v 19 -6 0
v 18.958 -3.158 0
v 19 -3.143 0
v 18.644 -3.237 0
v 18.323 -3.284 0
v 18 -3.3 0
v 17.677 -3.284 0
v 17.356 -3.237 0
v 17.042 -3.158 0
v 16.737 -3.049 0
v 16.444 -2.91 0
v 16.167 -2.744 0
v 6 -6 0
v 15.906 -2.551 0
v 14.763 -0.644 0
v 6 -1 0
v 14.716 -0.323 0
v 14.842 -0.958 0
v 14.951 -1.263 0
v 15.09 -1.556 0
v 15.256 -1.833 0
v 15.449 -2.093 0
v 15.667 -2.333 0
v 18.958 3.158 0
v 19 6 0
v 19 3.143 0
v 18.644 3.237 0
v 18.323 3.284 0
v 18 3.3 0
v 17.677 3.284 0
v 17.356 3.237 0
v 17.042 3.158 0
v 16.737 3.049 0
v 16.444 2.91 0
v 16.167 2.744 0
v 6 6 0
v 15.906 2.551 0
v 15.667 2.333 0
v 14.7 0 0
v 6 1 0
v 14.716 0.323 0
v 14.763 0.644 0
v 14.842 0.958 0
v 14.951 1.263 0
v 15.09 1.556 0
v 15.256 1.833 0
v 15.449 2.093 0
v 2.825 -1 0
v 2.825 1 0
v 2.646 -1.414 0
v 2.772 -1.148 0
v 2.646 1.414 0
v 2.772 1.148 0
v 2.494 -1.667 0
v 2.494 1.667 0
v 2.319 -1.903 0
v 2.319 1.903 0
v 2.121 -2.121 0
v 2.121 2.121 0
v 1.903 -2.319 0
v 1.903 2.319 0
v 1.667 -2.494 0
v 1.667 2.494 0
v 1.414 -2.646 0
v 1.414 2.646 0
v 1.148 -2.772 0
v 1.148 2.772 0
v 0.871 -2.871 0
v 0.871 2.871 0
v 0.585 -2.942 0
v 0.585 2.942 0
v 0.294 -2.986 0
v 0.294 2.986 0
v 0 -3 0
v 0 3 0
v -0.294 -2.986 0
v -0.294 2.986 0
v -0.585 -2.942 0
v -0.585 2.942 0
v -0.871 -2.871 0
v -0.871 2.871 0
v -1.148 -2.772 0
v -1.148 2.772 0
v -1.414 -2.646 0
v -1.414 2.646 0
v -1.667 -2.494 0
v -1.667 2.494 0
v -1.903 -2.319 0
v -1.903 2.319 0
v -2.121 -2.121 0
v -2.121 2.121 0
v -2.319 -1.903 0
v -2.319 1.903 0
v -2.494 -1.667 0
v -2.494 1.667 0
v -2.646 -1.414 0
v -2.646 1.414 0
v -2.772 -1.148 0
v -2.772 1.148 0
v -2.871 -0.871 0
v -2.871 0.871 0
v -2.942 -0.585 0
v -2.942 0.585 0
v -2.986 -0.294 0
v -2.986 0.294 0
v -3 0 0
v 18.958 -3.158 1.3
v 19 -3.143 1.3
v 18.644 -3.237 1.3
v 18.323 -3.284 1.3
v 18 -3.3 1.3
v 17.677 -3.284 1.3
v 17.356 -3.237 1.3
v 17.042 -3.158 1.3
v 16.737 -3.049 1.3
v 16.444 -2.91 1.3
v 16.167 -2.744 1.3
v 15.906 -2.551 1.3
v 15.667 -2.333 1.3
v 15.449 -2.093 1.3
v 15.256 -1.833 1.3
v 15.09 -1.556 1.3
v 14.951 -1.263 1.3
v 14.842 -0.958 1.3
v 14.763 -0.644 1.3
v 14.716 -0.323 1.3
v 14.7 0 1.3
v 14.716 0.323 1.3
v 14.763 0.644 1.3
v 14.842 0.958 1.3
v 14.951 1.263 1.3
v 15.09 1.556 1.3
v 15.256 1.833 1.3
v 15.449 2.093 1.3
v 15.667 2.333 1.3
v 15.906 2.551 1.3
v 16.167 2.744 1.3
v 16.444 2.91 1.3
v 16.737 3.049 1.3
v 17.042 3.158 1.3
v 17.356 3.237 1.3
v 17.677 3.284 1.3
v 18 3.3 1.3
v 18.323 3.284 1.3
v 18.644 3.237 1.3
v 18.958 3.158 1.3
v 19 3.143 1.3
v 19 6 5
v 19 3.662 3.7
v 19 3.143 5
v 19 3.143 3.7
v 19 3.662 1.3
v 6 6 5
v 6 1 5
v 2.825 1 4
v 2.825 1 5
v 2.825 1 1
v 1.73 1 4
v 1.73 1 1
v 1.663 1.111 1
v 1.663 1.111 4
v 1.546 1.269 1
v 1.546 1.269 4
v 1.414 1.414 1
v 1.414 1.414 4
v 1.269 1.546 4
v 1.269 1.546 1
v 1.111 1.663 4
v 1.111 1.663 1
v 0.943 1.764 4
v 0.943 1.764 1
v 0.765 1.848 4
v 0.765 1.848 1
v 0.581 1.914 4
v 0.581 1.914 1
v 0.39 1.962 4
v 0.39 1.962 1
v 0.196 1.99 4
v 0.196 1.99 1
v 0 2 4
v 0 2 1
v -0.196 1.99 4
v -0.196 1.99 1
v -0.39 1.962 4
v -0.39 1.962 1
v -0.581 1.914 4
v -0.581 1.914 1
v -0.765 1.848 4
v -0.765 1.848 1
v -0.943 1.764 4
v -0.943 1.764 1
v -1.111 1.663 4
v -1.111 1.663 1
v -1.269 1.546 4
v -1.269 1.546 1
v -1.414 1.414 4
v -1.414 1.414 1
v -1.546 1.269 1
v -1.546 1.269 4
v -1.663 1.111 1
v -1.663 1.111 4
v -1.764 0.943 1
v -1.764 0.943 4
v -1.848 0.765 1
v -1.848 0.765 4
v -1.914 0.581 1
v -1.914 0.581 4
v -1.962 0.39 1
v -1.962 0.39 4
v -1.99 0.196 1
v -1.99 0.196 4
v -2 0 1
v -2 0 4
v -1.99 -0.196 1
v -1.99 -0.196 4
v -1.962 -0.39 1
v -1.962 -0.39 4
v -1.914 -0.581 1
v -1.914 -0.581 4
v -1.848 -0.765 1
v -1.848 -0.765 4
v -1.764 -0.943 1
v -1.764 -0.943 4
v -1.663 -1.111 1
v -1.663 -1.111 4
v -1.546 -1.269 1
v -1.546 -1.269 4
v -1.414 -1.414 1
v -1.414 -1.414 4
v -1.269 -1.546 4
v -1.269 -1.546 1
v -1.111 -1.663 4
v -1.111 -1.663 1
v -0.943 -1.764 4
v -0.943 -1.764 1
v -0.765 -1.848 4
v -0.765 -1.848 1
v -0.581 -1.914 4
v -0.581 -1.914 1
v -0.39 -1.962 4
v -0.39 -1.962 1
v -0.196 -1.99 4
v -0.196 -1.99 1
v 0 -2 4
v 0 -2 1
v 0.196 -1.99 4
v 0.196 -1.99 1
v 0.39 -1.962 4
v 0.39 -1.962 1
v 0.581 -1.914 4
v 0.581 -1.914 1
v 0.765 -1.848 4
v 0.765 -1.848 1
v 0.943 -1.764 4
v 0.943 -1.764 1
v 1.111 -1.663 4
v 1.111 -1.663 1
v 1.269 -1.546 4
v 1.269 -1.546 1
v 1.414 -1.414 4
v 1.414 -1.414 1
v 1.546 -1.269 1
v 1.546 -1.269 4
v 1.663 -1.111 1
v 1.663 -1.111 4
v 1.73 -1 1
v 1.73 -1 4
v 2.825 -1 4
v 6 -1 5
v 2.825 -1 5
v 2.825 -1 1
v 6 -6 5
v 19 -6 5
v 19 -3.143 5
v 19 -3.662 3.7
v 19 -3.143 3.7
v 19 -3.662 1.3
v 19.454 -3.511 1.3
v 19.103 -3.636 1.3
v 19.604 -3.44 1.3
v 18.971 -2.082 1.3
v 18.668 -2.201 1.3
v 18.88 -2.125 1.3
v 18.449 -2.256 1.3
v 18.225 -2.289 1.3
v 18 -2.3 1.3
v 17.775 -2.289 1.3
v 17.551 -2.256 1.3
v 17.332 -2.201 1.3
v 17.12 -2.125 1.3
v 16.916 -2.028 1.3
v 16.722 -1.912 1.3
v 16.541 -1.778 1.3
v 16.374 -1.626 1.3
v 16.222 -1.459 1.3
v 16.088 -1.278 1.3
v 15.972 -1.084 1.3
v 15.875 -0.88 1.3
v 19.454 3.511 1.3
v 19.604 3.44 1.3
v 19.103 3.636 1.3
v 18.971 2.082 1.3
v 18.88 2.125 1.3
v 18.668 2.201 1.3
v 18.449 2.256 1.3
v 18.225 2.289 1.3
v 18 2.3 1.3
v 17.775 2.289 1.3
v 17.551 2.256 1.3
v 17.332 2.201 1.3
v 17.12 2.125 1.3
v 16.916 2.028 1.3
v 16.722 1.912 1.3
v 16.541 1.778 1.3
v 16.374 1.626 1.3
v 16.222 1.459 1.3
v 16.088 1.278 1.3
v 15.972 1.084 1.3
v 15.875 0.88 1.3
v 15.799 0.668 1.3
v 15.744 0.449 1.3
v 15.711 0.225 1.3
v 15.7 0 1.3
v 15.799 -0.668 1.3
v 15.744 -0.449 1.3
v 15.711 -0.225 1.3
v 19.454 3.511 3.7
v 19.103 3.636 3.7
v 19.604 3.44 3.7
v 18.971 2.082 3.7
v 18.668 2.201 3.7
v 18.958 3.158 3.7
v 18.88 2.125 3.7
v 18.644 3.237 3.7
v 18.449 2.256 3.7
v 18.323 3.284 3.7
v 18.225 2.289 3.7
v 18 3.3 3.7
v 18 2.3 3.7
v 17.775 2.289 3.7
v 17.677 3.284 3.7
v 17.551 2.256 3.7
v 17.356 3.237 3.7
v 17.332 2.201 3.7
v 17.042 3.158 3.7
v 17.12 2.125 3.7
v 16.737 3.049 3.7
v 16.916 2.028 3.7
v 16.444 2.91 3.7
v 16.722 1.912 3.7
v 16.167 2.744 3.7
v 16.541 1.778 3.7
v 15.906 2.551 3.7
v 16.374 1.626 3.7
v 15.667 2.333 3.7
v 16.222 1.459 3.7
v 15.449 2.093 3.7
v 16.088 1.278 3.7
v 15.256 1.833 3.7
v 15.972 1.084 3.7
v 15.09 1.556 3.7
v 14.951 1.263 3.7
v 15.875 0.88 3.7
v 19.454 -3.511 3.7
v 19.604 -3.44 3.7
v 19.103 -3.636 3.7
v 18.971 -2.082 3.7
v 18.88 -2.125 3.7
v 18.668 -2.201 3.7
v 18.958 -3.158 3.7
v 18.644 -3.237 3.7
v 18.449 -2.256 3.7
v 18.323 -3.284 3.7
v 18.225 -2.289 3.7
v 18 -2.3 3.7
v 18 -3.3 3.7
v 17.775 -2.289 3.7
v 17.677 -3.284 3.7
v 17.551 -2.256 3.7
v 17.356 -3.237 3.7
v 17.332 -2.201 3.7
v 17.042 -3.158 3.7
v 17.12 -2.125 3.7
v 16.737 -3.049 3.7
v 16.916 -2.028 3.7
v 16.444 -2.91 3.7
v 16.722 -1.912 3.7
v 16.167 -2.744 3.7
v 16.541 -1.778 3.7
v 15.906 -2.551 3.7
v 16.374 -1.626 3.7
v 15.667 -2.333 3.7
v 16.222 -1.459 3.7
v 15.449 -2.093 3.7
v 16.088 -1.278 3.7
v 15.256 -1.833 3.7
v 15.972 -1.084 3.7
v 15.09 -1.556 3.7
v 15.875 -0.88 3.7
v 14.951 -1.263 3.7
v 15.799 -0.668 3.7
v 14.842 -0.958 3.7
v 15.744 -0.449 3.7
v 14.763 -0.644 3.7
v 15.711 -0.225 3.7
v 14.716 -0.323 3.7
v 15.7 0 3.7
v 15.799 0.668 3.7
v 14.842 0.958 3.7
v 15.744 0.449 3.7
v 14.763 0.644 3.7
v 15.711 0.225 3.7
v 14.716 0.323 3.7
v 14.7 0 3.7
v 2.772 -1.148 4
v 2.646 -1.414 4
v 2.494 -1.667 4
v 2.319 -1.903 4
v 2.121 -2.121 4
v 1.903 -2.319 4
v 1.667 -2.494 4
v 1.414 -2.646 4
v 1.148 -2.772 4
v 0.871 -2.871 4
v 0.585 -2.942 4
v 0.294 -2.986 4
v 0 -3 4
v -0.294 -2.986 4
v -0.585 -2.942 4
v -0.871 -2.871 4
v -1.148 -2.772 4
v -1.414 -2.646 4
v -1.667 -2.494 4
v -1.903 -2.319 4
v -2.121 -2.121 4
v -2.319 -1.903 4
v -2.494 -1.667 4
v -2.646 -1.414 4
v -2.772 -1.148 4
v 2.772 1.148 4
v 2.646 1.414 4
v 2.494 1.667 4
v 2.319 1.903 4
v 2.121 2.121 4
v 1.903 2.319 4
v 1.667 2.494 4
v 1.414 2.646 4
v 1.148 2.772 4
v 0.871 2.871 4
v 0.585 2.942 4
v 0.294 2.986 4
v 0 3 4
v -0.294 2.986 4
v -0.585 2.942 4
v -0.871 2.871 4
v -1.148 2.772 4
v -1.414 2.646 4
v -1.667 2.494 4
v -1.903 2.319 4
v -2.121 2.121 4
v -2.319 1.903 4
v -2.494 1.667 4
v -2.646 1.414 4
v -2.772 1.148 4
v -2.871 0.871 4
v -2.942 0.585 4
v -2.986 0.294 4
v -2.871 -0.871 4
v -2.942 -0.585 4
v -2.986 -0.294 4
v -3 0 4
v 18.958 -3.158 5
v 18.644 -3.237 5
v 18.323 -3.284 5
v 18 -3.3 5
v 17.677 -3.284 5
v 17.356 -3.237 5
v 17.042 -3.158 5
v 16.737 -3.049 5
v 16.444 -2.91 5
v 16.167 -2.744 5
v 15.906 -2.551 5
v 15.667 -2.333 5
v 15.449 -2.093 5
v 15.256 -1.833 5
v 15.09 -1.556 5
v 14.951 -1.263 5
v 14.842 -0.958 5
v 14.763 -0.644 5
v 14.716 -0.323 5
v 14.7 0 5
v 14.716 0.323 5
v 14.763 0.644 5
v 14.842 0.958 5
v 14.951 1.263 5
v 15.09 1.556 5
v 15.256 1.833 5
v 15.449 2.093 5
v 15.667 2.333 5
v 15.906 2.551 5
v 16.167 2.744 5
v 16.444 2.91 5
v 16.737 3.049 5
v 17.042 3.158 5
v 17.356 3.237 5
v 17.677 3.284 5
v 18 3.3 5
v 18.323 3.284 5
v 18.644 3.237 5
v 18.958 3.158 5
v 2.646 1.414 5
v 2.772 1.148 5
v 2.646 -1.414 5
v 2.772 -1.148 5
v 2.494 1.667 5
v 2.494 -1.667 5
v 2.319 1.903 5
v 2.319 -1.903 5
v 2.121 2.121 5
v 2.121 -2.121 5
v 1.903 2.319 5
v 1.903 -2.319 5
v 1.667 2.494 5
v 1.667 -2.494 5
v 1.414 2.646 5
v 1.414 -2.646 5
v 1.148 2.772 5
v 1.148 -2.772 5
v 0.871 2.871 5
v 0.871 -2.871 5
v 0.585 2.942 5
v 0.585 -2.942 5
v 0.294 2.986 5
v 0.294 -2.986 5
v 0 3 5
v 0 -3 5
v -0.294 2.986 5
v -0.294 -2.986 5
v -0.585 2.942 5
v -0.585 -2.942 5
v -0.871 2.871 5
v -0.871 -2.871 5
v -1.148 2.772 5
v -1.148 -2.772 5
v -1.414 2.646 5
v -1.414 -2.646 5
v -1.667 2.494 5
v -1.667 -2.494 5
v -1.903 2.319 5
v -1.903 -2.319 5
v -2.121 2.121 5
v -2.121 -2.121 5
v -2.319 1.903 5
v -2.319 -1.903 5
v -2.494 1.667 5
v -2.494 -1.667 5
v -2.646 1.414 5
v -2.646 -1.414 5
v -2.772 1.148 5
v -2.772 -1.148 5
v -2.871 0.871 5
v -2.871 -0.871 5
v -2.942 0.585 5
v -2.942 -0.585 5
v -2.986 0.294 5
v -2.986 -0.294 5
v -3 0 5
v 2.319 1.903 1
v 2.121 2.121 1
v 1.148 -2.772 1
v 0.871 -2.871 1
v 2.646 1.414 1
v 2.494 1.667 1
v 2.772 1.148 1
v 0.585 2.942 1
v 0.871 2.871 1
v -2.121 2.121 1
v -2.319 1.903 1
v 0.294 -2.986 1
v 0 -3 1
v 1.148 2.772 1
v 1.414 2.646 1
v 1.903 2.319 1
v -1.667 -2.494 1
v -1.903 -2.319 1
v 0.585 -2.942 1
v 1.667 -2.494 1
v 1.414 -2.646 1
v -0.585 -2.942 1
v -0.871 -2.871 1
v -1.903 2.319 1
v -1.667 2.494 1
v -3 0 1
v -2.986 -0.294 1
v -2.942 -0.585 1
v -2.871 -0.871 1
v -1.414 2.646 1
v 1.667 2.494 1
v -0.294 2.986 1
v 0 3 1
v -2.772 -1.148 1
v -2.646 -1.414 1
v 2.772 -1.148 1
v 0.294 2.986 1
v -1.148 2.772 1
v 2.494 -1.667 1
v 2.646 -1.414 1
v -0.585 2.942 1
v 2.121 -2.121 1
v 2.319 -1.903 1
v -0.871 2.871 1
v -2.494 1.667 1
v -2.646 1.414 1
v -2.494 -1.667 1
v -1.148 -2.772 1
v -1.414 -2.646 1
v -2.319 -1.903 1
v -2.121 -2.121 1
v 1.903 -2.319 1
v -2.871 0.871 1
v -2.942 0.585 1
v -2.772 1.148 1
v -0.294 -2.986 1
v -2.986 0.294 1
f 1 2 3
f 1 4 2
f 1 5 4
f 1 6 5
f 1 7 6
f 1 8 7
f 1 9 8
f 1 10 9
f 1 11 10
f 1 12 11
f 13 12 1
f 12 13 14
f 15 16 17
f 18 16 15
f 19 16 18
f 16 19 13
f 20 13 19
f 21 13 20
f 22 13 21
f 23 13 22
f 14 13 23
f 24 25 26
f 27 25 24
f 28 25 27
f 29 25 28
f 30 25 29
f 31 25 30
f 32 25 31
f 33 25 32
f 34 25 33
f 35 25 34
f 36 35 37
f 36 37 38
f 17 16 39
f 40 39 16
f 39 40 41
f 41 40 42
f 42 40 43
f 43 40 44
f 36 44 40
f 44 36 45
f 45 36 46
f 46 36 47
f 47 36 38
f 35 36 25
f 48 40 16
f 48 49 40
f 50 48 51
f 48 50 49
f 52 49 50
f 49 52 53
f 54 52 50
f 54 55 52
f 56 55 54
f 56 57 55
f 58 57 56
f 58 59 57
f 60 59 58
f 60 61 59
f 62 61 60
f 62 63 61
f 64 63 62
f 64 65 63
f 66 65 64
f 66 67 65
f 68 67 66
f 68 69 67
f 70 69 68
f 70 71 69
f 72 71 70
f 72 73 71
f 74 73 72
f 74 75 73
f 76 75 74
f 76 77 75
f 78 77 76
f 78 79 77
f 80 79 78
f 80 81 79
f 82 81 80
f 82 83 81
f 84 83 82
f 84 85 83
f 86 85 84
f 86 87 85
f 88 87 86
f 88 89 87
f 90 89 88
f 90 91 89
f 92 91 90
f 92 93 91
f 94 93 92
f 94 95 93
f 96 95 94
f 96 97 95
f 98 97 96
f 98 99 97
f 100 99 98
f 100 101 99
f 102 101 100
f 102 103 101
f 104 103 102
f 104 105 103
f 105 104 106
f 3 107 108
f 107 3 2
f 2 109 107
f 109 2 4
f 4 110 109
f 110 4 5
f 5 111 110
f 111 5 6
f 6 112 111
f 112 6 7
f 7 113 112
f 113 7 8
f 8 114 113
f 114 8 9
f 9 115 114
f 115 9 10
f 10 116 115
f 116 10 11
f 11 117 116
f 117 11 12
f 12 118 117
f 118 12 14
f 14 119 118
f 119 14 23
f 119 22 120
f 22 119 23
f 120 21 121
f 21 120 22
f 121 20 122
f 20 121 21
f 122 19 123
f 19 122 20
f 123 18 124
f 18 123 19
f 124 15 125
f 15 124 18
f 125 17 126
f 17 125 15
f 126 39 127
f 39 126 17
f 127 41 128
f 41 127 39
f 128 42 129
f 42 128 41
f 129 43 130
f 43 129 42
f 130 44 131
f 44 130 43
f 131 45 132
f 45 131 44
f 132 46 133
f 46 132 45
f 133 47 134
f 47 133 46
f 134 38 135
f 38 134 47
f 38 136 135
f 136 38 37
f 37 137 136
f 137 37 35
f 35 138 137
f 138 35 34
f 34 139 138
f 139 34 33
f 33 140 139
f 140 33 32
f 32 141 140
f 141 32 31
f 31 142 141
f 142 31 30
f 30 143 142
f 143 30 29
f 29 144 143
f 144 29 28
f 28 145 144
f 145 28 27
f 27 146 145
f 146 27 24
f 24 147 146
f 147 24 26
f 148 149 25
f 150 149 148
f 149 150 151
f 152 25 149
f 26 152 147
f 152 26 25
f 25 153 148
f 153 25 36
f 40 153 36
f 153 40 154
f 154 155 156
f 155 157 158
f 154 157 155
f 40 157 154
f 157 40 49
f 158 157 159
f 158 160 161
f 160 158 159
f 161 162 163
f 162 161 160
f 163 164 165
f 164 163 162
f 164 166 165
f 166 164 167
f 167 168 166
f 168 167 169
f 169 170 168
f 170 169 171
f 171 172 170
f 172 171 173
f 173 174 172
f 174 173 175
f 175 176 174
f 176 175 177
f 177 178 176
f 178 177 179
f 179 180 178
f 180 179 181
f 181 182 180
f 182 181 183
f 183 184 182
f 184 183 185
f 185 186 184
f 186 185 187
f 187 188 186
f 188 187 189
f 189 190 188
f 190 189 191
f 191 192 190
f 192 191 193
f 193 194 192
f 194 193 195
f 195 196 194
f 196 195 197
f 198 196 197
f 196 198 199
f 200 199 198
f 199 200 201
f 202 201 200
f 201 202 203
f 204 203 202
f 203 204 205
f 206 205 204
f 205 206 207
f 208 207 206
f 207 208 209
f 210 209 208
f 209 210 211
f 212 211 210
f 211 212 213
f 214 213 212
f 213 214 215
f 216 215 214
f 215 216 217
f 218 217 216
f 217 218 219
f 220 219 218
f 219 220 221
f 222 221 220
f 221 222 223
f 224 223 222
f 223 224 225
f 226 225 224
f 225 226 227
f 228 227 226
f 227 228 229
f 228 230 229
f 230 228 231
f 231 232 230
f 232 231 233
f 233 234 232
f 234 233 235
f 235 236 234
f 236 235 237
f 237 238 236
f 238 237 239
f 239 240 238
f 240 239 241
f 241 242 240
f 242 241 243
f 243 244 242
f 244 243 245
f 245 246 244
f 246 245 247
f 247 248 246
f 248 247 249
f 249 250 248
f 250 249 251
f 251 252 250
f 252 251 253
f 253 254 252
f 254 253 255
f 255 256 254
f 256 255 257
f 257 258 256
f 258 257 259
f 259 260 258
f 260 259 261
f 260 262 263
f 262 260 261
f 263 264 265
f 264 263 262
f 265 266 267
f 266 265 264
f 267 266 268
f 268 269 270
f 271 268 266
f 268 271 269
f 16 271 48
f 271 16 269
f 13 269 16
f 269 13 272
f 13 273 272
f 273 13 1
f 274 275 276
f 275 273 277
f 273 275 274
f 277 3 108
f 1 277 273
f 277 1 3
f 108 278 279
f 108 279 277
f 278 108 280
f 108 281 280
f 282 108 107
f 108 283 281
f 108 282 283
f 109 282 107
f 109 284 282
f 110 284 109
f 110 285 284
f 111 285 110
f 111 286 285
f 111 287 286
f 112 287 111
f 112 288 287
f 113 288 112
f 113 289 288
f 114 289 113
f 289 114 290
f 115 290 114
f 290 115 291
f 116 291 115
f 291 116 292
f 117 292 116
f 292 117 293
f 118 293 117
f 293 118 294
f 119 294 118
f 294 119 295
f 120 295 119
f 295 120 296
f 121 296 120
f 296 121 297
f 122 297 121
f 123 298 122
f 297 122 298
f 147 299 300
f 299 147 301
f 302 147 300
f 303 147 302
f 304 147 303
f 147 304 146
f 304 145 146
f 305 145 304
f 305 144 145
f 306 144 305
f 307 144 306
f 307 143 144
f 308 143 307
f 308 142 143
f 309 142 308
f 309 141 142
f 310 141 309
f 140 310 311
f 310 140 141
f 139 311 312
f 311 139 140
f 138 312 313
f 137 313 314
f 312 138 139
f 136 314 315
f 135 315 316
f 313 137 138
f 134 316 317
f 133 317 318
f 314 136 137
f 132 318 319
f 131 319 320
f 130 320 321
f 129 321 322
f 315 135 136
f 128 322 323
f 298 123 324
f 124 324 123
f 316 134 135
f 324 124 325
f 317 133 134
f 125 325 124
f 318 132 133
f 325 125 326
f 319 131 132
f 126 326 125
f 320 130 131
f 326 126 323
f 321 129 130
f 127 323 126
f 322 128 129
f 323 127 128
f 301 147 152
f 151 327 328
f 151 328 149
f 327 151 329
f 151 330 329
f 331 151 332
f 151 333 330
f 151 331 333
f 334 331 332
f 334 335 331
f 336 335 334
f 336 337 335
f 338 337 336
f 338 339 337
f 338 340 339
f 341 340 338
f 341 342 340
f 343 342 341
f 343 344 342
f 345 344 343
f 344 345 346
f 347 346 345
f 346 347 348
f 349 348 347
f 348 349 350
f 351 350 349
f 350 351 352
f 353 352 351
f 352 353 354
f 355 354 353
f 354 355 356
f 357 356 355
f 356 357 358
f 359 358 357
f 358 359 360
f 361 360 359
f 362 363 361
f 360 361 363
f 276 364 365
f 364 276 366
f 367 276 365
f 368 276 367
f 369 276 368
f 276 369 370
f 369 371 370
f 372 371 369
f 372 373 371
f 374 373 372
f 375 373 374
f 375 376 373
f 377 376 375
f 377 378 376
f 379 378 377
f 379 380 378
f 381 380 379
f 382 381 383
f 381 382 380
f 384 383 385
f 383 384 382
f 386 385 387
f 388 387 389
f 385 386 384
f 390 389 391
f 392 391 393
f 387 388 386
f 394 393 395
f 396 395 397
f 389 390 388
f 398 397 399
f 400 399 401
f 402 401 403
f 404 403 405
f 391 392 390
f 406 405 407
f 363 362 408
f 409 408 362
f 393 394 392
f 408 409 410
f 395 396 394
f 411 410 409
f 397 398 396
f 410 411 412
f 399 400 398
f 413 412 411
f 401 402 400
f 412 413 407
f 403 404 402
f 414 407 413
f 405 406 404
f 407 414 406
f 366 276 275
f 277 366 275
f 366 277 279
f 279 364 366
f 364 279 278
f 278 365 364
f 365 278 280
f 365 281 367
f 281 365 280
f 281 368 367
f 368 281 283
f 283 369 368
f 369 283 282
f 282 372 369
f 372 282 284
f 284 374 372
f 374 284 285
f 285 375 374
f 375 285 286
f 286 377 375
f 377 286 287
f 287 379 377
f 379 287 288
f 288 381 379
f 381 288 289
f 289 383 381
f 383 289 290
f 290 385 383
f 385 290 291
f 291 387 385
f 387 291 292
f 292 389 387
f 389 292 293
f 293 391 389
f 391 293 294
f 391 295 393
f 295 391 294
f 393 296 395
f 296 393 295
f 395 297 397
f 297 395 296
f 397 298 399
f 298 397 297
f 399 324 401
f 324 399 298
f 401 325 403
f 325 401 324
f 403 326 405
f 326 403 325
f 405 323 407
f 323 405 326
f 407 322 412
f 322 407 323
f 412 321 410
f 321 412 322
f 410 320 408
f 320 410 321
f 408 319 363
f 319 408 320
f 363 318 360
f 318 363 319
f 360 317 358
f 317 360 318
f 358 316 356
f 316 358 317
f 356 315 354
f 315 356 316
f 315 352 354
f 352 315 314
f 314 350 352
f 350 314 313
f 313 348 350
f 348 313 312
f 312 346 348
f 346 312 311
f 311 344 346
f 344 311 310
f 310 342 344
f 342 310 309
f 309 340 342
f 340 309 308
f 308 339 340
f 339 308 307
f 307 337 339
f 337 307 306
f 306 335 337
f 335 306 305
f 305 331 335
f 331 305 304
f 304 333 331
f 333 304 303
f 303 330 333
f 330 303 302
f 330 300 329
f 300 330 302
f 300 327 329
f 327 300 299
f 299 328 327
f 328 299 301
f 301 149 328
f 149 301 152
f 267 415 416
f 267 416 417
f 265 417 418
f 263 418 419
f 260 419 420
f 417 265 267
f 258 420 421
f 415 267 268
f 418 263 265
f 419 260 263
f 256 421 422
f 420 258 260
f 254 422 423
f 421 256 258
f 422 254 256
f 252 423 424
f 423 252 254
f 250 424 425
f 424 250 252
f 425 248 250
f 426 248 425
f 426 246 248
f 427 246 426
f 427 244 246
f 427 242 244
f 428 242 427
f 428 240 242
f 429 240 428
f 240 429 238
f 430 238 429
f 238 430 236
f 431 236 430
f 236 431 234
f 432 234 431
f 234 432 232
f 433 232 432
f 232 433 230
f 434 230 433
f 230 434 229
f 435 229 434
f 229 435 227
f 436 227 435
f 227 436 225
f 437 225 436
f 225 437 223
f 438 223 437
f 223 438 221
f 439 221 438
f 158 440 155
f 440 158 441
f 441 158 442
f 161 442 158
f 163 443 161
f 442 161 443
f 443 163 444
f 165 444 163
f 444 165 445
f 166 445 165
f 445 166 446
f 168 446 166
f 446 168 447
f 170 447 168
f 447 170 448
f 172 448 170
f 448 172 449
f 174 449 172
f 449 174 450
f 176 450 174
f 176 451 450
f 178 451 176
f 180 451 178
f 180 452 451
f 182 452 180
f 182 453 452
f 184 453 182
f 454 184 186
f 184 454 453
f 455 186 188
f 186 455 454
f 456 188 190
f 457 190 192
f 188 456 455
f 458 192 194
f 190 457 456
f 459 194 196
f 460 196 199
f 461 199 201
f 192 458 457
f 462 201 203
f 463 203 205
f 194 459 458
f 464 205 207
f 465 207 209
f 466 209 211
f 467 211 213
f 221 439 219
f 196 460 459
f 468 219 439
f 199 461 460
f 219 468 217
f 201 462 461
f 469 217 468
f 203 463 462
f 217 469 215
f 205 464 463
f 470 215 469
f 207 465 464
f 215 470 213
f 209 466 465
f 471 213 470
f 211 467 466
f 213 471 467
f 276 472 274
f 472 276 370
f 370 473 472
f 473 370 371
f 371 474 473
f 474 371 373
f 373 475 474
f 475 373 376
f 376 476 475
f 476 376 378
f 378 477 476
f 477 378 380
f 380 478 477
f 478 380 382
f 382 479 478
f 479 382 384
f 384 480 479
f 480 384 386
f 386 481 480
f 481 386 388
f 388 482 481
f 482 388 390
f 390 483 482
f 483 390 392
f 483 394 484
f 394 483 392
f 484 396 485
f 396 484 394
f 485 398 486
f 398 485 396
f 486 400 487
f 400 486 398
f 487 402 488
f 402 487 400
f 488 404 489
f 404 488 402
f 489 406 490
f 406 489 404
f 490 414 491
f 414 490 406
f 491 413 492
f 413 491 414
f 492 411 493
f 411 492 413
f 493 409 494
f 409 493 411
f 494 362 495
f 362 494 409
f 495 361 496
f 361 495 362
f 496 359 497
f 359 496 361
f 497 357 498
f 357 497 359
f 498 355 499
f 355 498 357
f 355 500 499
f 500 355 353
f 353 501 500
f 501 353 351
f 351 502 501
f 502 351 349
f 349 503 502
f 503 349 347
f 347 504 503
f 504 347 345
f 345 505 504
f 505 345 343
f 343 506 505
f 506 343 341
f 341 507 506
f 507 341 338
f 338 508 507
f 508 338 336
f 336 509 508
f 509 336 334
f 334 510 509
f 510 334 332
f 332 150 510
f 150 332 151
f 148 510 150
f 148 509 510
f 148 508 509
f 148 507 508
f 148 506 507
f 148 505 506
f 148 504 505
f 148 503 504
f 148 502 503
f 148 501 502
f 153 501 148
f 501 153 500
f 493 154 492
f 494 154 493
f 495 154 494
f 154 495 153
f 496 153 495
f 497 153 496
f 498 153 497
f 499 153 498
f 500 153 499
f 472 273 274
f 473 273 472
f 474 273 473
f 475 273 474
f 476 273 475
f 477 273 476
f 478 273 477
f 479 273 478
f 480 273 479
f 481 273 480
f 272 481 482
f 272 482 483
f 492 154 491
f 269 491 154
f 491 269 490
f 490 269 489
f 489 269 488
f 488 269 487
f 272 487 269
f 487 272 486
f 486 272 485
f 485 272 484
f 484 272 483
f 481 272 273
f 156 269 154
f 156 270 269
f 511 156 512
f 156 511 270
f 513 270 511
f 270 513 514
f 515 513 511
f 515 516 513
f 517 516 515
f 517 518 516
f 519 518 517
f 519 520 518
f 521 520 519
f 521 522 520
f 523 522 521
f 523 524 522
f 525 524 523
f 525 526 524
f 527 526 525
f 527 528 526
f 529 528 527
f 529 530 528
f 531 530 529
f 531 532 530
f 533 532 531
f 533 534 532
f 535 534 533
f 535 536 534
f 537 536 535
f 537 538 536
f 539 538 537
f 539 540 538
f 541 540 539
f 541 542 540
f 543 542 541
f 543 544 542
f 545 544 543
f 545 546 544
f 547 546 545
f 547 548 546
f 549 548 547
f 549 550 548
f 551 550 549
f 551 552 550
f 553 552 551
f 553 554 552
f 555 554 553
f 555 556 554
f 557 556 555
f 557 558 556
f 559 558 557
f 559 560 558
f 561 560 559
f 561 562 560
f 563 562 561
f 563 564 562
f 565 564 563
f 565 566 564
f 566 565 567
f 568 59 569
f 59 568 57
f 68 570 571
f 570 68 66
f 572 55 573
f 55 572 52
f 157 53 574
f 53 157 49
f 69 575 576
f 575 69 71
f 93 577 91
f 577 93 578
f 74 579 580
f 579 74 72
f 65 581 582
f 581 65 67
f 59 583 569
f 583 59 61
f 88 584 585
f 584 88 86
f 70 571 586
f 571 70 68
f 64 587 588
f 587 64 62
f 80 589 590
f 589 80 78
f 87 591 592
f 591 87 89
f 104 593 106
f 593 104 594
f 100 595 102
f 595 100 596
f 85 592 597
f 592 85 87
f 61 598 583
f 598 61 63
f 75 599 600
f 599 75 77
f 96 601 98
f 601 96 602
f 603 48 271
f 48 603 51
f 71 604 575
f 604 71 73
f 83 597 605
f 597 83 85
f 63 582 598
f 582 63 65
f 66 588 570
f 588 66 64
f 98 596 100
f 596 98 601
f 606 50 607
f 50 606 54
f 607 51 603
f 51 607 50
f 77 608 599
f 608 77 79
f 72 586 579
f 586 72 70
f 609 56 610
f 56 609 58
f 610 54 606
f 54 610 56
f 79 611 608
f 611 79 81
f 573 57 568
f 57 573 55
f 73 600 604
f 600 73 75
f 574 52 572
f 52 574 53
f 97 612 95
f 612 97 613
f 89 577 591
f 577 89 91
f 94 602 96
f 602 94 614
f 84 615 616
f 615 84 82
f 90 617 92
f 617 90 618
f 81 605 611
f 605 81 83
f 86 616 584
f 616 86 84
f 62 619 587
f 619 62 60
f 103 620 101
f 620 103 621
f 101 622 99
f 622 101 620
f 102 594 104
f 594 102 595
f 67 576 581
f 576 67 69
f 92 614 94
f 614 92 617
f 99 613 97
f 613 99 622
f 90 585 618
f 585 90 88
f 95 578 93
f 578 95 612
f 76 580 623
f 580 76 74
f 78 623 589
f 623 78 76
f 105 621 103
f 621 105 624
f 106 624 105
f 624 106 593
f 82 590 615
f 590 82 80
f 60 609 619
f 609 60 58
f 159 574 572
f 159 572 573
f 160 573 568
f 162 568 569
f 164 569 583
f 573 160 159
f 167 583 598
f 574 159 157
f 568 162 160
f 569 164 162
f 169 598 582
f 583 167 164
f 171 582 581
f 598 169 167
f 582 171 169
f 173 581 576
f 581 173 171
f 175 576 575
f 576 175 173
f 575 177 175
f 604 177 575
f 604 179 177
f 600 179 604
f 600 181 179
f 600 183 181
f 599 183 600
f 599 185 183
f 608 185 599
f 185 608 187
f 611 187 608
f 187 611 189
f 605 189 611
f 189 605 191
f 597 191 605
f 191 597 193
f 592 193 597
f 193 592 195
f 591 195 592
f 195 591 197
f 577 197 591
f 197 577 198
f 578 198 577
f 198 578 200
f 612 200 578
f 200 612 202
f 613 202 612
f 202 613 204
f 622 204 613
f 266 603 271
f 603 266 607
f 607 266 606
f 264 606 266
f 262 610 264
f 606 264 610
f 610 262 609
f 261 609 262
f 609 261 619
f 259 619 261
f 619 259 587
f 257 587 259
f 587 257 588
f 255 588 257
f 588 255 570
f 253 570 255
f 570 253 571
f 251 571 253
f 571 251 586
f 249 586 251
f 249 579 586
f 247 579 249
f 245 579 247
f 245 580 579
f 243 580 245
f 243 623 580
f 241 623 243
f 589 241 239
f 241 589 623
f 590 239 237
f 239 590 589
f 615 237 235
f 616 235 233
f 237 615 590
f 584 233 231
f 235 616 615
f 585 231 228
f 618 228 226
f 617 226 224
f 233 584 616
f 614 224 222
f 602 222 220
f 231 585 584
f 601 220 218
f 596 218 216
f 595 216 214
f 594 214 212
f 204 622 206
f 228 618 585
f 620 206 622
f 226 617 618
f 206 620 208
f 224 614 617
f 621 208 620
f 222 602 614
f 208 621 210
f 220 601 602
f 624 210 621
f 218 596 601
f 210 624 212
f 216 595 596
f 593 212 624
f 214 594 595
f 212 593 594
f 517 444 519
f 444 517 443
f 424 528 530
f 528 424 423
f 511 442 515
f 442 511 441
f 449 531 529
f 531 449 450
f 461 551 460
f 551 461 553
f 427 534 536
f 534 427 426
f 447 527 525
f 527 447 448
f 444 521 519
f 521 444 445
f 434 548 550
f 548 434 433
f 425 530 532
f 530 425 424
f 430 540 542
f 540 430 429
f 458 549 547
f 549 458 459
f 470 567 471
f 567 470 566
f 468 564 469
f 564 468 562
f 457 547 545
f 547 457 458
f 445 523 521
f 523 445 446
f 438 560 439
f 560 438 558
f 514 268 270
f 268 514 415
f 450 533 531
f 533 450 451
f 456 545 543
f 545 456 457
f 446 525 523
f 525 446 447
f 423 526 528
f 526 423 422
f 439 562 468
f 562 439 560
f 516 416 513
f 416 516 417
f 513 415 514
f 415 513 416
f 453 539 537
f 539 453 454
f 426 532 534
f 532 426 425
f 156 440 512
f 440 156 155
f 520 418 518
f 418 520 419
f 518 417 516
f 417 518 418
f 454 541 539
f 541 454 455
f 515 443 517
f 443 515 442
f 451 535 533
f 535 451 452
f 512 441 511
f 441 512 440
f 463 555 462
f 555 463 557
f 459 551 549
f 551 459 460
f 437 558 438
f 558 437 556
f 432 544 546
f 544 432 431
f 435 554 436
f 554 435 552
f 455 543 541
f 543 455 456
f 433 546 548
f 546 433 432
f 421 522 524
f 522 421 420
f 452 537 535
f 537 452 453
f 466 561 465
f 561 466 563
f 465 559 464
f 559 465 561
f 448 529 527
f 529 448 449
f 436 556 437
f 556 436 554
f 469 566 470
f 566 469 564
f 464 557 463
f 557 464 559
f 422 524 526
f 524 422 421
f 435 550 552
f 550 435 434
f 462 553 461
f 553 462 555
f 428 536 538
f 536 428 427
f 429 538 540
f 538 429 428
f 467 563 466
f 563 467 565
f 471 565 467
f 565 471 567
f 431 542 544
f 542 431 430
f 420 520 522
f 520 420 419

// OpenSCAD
part = "link"; // [link, assembly]
cadverify_only = "";
module instance(name, part, unit = 1) {
    echo(cadverify_instance = [name, part, unit]);
    if (cadverify_only == "" || cadverify_only == name) children();
}

// Parameters (mm)
pitch = 18;          // pin-to-bore distance (10 links = 180mm)
link_w = 12;         // width (Y)
link_t = 5;          // thickness (Z)
pin_d = 4;           // pin shaft diameter
bore_d = 4.6;        // bore diameter (0.3 radial clearance)
cap_d = 6;           // cap diameter
cap_h = 1;           // cap thickness
gap_z = 0.3;         // vertical clearance cap<->knuckle
kn_out_d = 7.6;      // knuckle outer diameter (1.5 wall)
cap_cav_d = 6.6;     // cap cavity diameter (0.3 radial clearance)
neck_w = 2;          // neck width
slot_half = 65;      // slot half-angle (deg), allows +-30 deg swing
yoke_west = 6;       // yoke west edge (local X)
yoke_east = 19;      // yoke east extent (local X, 1.0 past bore)
$fn = 64;

module link_geom() {
    bore_x = pitch;
    pin_r = pin_d/2;
    bore_r = bore_d/2;
    kn_out_r = kn_out_d/2;
    cav_r = cap_cav_d/2;
    cap_r = cap_d/2;
    wedge_far = 30;
    dy_far = wedge_far * tan(slot_half);
    bot_h = cap_h;            // 0..1
    gap_h = gap_z;            // 0.3
    kn_h = link_t - 2*cap_h - 2*gap_h; // 2.4 (1.3..3.7)
    // bottom (0..1): pin+neck+yoke minus cap cavity minus slot
    translate([0,0,0]) linear_extrude(height = bot_h, convexity = 8) {
        difference() {
            union() {
                circle(r = pin_r);
                translate([0,-neck_w/2]) square([yoke_west+1, neck_w]);
                translate([yoke_west,-link_w/2]) square([yoke_east-yoke_west, link_w]);
            }
            translate([bore_x,0]) circle(r = cav_r);
            polygon(points = [[bore_x,0],[bore_x+wedge_far, dy_far],[bore_x+wedge_far, -dy_far]]);
        }
    }
    // lower gap (1..1.3): same footprint
    translate([0,0,bot_h]) linear_extrude(height = gap_h, convexity = 8) {
        difference() {
            union() {
                circle(r = pin_r);
                translate([0,-neck_w/2]) square([yoke_west+1, neck_w]);
                translate([yoke_west,-link_w/2]) square([yoke_east-yoke_west, link_w]);
            }
            translate([bore_x,0]) circle(r = cav_r);
            polygon(points = [[bore_x,0],[bore_x+wedge_far, dy_far],[bore_x+wedge_far, -dy_far]]);
        }
    }
    // middle knuckle zone (1.3..3.7)
    translate([0,0,bot_h+gap_h]) linear_extrude(height = kn_h, convexity = 8) {
        difference() {
            union() {
                circle(r = pin_r);
                translate([0,-neck_w/2]) square([yoke_west+1, neck_w]);
                translate([yoke_west,-link_w/2]) square([yoke_east-yoke_west, link_w]);
                translate([bore_x,0]) circle(r = kn_out_r);
            }
            translate([bore_x,0]) circle(r = bore_r);
            polygon(points = [[bore_x,0],[bore_x+wedge_far, dy_far],[bore_x+wedge_far, -dy_far]]);
        }
    }
    // upper gap (3.7..4)
    translate([0,0,bot_h+gap_h+kn_h]) linear_extrude(height = gap_h, convexity = 8) {
        difference() {
            union() {
                circle(r = pin_r);
                translate([0,-neck_w/2]) square([yoke_west+1, neck_w]);
                translate([yoke_west,-link_w/2]) square([yoke_east-yoke_west, link_w]);
            }
            translate([bore_x,0]) circle(r = cav_r);
            polygon(points = [[bore_x,0],[bore_x+wedge_far, dy_far],[bore_x+wedge_far, -dy_far]]);
        }
    }
    // top (4..5)
    translate([0,0,bot_h+gap_h+kn_h+gap_h]) linear_extrude(height = bot_h, convexity = 8) {
        difference() {
            union() {
                circle(r = pin_r);
                translate([0,-neck_w/2]) square([yoke_west+1, neck_w]);
                translate([yoke_west,-link_w/2]) square([yoke_east-yoke_west, link_w]);
            }
            translate([bore_x,0]) circle(r = cav_r);
            polygon(points = [[bore_x,0],[bore_x+wedge_far, dy_far],[bore_x+wedge_far, -dy_far]]);
        }
    }
    // caps (pin ends)
    translate([0,0,0]) cylinder(h = cap_h, r = cap_r);
    translate([0,0,link_t-cap_h]) cylinder(h = cap_h, r = cap_r);
}

if (part == "assembly") {
    instance("link1", "link", 1) translate([0,0,0]) link_geom();
    instance("link2", "link", 1) translate([18,0,0]) link_geom();
    instance("link3", "link", 1) translate([36,0,0]) link_geom();
    echo(cadverify_spec = [
        ["bounds", [[-3, -6, 0], [56.5, 6, 5]]],
        ["support_faces", [["bed", "-z", 200]]],
        ["motions", [
            ["bend", ["link3"], "rotate", [36, 0, 0], [0, 0, 1], [-30, 30]]
        ]],
        ["assembly_order", [
            [["link1", "link2", "link3"], [0, 0, 0]]
        ]],
        ["print_in_place", 0.3],
        ["overhangs_allowed", [
            ["pin cap link1", [[-3, -3, 3.8], [3, 3, 4.2]]],
            ["knuckle joint1", [[14, -4, 1.0], [22, 4, 1.6]]],
            ["pin cap link2", [[15, -3, 3.8], [21, 3, 4.2]]],
            ["knuckle joint2", [[32, -4, 1.0], [40, 4, 1.6]]],
            ["pin cap link3", [[33, -3, 3.8], [39, 3, 4.2]]],
            ["knuckle end", [[50, -4, 1.0], [58, 4, 1.6]]]
        ]],
        ["held", ["link1", "link2", "link3"]]
    ]);
} else {
    link_geom();
    echo(cadverify_spec = [
        ["bounds", [[-3, -6, 0], [20.5, 6, 5]]],
        ["bodies", 1],
        ["through_holes", 0],
        ["support_faces", [["bed", "-z", 100]]],
        ["overhangs_allowed", [
            ["pin cap", [[-3, -3, 3.8], [3, 3, 4.2]]],
            ["knuckle ceiling", [[14, -4, 1.0], [22, 4, 1.6]]]
        ]],
        ["copies", 3],
        ["details", [
            ["body", "material", [[6, -6, 0], [14, 6, 5]], 0.85],
            ["neck", "material", [[0, -1, 0], [7, 1, 5]], 0.8],
            ["knuckle", "material", [[14.2, -3.8, 1.3], [21.8, 3.8, 3.7]], 0.25],
            ["slot", "void", [[19, -1, 0], [21, 1, 5]], 0.8],
            ["cap_cavity", "void", [[14.7, -3.3, 0], [21.3, 3.3, 1]], 0.5],
            ["wall", "thickness", [18, 7, 2.5], [0, -1, 0], 3.7],
            ["floor", "thickness", [9, 0, -1], [0, 0, 1], 5]
        ]]
    ]);
}
